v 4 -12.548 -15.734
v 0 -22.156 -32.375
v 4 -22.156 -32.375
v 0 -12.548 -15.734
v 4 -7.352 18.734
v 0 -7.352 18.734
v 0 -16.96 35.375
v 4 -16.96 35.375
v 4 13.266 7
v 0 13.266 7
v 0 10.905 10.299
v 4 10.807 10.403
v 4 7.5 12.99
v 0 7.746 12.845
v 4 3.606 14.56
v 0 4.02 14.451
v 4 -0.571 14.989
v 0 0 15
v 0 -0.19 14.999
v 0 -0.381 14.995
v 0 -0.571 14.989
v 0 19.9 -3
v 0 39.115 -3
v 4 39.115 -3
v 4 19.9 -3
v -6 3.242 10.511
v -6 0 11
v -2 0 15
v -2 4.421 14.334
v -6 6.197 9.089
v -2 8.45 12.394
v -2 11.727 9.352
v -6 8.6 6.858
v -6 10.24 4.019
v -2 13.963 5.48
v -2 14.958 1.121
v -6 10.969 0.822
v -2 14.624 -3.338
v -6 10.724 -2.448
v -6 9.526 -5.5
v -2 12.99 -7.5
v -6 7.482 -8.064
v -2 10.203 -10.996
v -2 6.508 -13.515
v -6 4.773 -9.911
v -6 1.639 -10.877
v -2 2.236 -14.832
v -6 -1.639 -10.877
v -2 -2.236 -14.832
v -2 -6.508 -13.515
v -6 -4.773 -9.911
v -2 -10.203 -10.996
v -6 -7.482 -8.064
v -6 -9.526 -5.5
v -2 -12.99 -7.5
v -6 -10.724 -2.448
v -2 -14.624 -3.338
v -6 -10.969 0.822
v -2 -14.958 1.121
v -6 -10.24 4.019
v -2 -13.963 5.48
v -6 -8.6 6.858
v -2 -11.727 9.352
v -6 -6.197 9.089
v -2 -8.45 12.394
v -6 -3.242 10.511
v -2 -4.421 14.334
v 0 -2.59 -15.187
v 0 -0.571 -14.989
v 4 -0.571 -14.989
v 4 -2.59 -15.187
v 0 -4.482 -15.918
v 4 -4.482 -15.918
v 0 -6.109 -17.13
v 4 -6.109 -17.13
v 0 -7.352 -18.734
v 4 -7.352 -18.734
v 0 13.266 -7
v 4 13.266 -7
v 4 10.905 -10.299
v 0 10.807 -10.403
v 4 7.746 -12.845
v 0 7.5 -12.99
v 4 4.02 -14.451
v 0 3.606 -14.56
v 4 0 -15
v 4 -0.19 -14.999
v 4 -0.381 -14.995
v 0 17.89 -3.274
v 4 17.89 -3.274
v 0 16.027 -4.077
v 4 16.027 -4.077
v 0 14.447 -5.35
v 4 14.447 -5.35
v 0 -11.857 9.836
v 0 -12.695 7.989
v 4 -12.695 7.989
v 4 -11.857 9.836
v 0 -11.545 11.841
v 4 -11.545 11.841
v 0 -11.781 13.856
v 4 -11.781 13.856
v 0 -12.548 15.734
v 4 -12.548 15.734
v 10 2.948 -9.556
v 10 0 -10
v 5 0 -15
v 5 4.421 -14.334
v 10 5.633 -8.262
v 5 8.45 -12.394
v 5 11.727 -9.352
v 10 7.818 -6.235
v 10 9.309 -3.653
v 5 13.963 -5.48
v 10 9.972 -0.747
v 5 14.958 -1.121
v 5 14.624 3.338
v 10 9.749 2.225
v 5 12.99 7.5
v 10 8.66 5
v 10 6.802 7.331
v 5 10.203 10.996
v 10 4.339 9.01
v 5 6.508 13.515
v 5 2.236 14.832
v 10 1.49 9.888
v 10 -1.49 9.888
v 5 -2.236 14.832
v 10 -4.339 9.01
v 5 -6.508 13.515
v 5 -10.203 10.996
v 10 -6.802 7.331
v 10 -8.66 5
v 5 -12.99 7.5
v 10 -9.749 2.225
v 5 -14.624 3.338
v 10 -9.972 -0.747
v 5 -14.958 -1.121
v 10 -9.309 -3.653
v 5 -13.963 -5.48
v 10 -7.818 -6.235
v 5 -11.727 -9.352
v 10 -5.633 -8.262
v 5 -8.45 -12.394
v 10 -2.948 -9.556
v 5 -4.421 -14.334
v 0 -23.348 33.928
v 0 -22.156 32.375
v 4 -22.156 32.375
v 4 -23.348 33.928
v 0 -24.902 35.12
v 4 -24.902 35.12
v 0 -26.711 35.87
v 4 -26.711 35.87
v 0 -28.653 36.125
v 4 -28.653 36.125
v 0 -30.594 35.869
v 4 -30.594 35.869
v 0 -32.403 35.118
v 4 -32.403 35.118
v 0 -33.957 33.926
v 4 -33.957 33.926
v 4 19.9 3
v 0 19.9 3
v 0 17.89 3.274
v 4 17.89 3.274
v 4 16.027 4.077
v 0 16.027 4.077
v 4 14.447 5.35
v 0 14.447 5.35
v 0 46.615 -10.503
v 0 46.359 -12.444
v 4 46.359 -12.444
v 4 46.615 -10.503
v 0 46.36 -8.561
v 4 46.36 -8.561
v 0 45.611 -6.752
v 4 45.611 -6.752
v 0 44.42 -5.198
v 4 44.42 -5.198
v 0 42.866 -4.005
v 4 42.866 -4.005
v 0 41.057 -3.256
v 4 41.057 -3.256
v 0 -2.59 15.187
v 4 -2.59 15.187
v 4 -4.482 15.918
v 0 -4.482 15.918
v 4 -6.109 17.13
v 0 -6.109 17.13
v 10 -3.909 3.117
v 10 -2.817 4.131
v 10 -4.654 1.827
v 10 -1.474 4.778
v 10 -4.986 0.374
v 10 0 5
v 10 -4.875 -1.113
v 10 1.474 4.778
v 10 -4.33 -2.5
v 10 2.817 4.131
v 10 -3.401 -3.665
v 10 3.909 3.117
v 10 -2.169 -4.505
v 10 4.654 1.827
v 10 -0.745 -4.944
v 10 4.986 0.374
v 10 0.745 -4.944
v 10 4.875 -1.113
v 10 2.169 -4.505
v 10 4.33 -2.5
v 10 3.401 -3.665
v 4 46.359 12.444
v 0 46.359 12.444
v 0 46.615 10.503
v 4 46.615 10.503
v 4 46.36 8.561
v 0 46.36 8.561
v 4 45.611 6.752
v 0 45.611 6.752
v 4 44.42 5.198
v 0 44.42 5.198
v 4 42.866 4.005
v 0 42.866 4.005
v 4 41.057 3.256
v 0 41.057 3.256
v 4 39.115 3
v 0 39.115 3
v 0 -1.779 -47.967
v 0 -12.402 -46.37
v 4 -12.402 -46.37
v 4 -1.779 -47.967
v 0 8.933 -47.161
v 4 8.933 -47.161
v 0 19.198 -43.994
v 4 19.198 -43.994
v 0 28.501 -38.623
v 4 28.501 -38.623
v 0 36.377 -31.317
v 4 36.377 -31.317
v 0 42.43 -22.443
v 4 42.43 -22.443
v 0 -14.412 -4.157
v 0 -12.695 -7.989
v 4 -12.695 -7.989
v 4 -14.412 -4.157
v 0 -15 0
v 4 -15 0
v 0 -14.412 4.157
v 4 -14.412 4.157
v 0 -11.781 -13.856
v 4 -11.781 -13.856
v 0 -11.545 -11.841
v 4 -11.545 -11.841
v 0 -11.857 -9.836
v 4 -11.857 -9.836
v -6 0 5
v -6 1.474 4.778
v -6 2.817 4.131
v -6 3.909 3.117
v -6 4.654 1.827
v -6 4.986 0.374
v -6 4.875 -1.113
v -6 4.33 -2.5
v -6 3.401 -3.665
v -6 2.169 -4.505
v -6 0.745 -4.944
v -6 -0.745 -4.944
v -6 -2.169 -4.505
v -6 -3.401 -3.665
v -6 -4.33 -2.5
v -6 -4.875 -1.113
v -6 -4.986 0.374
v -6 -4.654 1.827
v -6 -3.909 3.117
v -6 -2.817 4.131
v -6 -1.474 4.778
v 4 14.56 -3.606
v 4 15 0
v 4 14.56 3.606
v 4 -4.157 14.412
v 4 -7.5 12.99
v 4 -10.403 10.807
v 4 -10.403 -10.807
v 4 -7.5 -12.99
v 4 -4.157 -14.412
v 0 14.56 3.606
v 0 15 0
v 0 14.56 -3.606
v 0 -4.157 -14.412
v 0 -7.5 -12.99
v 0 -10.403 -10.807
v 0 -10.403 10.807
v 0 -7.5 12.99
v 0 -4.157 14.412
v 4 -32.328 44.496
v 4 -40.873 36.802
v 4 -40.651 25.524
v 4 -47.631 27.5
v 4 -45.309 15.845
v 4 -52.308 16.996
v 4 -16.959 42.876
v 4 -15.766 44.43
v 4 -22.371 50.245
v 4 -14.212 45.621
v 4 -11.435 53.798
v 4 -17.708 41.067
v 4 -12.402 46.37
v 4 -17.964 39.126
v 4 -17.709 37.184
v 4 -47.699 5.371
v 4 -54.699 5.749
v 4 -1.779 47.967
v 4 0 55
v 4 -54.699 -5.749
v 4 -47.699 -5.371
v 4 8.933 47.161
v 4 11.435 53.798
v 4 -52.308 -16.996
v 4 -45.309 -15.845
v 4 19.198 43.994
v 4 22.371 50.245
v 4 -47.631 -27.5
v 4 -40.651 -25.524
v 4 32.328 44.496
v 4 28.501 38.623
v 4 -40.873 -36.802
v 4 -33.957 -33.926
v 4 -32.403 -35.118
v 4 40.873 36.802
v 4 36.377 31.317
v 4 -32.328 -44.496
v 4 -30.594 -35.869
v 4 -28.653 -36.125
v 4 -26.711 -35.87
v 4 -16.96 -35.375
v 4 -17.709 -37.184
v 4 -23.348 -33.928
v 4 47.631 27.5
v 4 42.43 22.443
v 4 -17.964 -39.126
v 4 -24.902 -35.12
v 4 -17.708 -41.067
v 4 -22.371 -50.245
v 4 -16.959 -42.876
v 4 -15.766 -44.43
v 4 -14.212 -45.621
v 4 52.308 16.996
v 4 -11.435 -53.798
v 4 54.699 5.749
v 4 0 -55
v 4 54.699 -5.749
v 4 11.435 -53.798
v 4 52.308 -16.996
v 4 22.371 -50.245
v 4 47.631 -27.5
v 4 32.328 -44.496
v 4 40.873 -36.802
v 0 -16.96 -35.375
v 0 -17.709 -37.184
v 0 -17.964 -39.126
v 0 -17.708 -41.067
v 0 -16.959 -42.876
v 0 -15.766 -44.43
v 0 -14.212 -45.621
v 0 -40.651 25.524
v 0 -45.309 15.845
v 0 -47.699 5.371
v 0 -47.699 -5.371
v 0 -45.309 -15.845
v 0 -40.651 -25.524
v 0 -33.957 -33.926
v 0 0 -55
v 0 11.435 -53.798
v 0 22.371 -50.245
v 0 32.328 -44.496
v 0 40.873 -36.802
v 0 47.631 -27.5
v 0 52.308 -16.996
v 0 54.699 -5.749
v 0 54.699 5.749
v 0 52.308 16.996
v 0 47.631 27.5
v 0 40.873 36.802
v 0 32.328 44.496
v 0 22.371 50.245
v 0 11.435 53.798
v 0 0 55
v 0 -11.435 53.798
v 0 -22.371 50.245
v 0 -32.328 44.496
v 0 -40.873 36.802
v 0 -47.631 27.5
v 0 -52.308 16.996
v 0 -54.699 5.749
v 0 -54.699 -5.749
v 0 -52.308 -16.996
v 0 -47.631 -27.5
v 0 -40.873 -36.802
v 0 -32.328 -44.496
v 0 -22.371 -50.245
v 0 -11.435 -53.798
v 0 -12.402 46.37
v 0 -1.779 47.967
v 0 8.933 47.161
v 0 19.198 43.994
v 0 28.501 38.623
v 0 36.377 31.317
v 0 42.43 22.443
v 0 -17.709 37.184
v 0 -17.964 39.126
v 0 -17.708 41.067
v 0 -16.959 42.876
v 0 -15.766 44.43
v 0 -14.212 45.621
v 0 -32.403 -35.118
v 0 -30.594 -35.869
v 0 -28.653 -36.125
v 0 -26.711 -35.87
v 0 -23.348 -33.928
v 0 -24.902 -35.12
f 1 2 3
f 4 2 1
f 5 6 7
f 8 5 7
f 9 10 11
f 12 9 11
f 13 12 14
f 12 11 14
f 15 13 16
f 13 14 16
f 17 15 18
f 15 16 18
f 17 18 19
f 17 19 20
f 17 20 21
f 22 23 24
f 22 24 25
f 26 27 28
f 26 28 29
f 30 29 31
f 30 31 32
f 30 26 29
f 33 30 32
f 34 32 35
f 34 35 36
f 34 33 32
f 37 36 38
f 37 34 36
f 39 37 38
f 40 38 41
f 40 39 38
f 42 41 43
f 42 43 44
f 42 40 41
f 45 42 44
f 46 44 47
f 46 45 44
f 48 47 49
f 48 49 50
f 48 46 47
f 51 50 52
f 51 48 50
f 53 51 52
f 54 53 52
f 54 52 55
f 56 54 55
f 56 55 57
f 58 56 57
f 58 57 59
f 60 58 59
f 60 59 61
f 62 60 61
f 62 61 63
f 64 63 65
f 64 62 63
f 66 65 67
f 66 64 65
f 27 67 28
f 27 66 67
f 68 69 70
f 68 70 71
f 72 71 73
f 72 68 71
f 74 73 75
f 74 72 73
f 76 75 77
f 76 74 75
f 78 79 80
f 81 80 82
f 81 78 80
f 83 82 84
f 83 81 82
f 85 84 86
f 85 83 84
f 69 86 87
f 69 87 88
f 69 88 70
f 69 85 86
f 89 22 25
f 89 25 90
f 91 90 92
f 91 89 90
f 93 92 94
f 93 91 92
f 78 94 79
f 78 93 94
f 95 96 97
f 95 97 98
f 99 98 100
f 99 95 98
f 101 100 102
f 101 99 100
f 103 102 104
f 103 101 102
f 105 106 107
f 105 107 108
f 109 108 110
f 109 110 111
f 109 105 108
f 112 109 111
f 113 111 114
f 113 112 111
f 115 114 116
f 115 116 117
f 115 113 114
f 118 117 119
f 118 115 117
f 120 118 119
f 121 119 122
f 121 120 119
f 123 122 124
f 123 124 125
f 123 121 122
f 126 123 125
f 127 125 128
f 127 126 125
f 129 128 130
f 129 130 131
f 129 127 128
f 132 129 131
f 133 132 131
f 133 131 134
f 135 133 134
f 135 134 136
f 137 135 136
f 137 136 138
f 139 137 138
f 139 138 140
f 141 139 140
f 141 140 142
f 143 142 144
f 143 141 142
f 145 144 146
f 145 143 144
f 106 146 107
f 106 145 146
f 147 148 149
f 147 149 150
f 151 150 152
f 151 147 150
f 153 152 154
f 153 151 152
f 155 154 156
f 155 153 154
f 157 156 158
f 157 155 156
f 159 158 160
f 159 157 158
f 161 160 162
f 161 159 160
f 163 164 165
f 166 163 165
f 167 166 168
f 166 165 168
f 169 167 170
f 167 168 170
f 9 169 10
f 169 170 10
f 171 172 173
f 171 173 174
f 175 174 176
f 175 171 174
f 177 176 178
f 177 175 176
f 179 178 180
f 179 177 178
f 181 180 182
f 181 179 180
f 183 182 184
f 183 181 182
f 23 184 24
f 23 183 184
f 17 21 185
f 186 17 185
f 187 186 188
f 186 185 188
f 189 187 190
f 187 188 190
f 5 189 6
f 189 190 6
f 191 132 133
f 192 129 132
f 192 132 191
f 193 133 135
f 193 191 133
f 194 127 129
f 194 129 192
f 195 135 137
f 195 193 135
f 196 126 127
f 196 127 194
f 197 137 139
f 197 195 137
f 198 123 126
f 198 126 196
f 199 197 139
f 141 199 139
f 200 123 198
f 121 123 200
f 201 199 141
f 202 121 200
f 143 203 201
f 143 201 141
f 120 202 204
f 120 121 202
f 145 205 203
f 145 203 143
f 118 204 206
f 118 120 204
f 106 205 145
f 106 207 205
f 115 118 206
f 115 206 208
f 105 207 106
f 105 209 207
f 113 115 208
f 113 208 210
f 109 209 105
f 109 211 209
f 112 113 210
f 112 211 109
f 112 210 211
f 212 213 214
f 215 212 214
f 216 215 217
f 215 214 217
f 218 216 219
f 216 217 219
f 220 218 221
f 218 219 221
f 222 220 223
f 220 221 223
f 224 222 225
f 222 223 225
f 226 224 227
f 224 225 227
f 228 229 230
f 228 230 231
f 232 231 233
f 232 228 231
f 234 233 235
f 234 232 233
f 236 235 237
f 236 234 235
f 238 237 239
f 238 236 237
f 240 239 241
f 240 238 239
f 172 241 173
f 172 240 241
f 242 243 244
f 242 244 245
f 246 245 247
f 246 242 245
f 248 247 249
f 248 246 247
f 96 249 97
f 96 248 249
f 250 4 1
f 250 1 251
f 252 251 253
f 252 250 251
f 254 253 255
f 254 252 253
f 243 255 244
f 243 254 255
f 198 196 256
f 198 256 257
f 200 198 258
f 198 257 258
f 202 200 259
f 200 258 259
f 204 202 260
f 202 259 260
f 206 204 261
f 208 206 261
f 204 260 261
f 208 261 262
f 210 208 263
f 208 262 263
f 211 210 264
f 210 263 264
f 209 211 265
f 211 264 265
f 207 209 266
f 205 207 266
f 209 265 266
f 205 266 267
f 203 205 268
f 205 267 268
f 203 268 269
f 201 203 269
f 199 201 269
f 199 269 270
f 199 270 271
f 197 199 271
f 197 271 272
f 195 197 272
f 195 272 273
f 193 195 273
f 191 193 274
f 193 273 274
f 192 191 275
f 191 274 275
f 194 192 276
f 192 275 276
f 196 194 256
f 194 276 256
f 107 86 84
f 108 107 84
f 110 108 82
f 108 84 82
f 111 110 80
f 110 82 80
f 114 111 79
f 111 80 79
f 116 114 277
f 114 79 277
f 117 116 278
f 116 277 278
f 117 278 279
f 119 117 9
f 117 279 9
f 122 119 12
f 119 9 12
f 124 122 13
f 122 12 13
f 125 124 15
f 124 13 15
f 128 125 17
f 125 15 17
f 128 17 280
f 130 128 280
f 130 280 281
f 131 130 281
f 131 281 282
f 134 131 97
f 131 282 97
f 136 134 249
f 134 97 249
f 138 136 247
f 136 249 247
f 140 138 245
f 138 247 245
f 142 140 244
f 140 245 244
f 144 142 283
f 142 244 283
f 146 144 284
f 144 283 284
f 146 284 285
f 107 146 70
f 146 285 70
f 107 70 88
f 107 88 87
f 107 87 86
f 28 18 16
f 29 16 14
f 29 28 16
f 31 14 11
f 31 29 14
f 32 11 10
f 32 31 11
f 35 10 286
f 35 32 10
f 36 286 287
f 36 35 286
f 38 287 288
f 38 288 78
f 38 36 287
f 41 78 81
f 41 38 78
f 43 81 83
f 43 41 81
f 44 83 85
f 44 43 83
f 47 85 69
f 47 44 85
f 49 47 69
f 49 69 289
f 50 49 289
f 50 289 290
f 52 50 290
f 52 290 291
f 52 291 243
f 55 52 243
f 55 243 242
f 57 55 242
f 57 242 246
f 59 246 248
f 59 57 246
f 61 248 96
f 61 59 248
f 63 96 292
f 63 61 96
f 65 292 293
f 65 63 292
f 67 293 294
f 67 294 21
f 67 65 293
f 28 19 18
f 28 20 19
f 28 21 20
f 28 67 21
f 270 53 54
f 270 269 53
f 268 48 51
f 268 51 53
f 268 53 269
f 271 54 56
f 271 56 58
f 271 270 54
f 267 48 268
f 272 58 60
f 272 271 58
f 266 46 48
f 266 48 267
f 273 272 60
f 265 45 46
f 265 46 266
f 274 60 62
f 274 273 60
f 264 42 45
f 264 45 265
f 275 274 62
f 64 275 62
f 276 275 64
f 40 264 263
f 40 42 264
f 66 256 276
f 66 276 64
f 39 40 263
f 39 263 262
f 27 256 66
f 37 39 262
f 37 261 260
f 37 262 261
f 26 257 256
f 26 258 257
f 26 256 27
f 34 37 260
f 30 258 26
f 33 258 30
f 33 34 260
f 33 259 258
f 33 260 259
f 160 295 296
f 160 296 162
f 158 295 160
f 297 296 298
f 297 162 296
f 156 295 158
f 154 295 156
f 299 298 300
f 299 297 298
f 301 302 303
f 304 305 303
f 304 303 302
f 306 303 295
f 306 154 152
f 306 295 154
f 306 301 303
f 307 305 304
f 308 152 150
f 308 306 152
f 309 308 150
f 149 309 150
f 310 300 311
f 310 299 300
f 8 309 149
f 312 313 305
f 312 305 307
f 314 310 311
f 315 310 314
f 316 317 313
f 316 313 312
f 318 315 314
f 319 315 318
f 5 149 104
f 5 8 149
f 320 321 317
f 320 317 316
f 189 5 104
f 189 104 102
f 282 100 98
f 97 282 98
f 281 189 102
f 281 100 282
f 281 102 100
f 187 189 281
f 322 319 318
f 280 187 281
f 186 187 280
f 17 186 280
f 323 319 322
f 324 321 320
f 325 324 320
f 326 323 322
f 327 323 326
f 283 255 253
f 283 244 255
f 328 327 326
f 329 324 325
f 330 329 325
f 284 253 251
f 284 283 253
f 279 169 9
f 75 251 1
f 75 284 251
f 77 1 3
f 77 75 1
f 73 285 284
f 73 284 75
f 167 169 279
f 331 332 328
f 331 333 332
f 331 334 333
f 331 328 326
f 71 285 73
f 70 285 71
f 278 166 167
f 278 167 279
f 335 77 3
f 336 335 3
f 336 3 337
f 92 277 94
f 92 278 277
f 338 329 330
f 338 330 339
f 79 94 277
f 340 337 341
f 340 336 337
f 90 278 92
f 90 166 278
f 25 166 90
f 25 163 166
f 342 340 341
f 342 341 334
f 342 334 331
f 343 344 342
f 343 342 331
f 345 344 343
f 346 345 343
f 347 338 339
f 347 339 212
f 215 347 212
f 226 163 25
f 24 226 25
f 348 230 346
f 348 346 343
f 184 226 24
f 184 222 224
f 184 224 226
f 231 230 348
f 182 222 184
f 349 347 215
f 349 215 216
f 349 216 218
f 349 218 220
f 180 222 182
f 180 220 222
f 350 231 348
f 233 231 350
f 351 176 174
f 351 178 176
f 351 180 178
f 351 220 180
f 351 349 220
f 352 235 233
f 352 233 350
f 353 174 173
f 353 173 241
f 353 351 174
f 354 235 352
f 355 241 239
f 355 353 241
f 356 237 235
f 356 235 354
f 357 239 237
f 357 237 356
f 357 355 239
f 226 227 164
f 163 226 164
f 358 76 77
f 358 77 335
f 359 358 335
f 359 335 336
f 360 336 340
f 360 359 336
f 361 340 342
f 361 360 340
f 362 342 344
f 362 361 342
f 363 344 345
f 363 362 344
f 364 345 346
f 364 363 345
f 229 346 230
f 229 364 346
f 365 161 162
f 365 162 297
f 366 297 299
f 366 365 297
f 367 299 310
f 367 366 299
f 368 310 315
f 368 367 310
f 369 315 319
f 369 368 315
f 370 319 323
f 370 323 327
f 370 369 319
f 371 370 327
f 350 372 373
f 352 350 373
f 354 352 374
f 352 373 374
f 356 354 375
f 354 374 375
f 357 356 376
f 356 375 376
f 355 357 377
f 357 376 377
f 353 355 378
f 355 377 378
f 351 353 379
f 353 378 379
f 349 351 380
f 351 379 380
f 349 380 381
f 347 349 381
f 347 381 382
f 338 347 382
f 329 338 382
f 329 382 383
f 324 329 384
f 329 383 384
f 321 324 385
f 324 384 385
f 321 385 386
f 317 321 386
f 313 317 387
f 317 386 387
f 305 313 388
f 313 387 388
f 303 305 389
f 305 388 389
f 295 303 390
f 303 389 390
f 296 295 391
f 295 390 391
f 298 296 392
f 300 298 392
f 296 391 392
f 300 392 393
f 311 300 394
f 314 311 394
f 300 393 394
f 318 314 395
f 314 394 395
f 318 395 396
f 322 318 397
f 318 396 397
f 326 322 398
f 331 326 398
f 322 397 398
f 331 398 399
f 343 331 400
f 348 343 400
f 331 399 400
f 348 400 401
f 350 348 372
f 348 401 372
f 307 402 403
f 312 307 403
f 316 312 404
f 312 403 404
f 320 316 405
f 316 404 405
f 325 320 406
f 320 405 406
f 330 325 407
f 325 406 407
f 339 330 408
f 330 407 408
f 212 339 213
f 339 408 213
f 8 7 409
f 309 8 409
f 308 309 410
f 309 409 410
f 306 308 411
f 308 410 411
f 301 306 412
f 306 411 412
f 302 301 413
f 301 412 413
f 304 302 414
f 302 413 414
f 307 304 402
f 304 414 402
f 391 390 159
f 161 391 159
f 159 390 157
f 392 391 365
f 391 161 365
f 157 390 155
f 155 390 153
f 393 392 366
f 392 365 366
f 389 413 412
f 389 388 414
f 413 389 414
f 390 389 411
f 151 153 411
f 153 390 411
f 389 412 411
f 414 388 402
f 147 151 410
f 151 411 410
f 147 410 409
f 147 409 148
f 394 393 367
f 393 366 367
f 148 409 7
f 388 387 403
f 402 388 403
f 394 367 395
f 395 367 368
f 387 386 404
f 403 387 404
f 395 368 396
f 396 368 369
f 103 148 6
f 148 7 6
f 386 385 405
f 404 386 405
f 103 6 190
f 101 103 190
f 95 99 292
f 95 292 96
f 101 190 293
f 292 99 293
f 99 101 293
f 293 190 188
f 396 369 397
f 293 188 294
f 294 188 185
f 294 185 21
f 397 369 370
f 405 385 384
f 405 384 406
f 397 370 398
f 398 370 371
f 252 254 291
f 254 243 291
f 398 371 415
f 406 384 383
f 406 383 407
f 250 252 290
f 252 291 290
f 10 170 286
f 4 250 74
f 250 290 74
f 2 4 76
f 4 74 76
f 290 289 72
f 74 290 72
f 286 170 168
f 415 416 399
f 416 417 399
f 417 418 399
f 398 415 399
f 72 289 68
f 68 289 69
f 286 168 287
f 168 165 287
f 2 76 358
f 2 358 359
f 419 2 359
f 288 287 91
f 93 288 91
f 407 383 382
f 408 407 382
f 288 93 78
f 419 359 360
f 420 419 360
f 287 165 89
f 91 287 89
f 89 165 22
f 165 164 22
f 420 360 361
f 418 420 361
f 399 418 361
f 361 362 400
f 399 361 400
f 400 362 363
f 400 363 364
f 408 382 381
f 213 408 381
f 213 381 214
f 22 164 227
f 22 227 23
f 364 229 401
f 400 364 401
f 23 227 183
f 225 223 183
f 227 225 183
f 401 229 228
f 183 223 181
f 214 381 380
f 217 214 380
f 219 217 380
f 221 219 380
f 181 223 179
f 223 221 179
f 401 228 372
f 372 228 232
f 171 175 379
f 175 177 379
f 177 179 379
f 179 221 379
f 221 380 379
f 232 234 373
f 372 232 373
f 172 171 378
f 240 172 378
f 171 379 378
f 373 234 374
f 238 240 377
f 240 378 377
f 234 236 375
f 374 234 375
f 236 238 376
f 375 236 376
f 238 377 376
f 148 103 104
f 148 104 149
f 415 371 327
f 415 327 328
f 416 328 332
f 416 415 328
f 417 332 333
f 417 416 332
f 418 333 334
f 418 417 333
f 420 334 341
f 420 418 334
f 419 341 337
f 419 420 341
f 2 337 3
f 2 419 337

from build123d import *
from build123d.topology import SkipClean

# Parameters (mm, degrees)
SKETCH_1_R          = 55
EXTRUDE_1_DEPTH     = 4
SKETCH_4_R          = 15
SKETCH_3_R          = 15
SKETCH_7_R          = 15
SKETCH_6_R          = 15
SKETCH_9_R          = 5
CUT_EXTRUDE_1_DEPTH = 24
CHAMFER_1_SIZE      = 5
CHAMFER_2_SIZE      = 4


with BuildPart() as part:
    # 草图1 → 凸台-拉伸1 (new body)
    with BuildSketch(Plane(origin=(0, 0, 0), x_dir=(0, 0, -1), z_dir=(1, 0, 0))):
        Circle(SKETCH_1_R)
        with BuildLine():
            Line((-3, 39.115214431), (-3, 19.899748742))
            ThreePointArc((-3, 19.899748742), (-4.077383711, 16.026765396), (-7, 13.266499161))
            ThreePointArc((-7, 13.266499161), (-12.990381057, 7.5), (-14.989125293, -0.571071754))
            ThreePointArc((-14.989125293, -0.571071754), (-15.918277829, -4.482264824), (-18.73368794, -7.35179816))
            Line((-18.73368794, -7.35179816), (-35.374769372, -16.959531004))
            ThreePointArc((-35.374769372, -16.959531004), (-41.996474081, -17.39278273), (-46.370097033, -12.402181305))
            ThreePointArc((-46.370097033, -12.402181305), (-41.569219382, 24), (-12.444444444, 46.358772659))
            ThreePointArc((-12.444444444, 46.358772659), (-5.935645354, 45.066404788), (-3, 39.115214431))
        make_face(mode=Mode.SUBTRACT)
        with BuildLine():
            Line((3, 39.115214431), (3, 19.899748742))
            ThreePointArc((3, 19.899748742), (4.077383711, 16.026765396), (7, 13.266499161))
            ThreePointArc((7, 13.266499161), (12.990381057, 7.5), (14.989125293, -0.571071754))
            ThreePointArc((14.989125293, -0.571071754), (15.918277829, -4.482264824), (18.73368794, -7.35179816))
            Line((18.73368794, -7.35179816), (35.374769372, -16.959531004))
            ThreePointArc((35.374769372, -16.959531004), (41.996474081, -17.39278273), (46.370097033, -12.402181305))
            ThreePointArc((46.370097033, -12.402181305), (41.569219382, 24), (12.444444444, 46.358772659))
            ThreePointArc((12.444444444, 46.358772659), (5.935645354, 45.066404788), (3, 39.115214431))
        make_face(mode=Mode.SUBTRACT)
        with BuildLine():
            Line((32.374769372, -22.155683427), (15.73368794, -12.547950582))
            ThreePointArc((15.73368794, -12.547950582), (11.840894118, -11.544500572), (7.989125293, -12.695427407))
            ThreePointArc((7.989125293, -12.695427407), (0, -15), (-7.989125293, -12.695427407))
            ThreePointArc((-7.989125293, -12.695427407), (-11.840894118, -11.544500572), (-15.73368794, -12.547950582))
            Line((-15.73368794, -12.547950582), (-32.374769372, -22.155683427))
            ThreePointArc((-32.374769372, -22.155683427), (-36.060828727, -27.673622059), (-33.925652589, -33.956591354))
            ThreePointArc((-33.925652589, -33.956591354), (0, -48), (33.925652589, -33.956591354))
            ThreePointArc((33.925652589, -33.956591354), (36.060828727, -27.673622059), (32.374769372, -22.155683427))
        make_face(mode=Mode.SUBTRACT)
    extrude(amount=EXTRUDE_1_DEPTH)

    # 草图4 → 放样1 section 0
    with BuildSketch(Plane.ZY):
        Circle(SKETCH_4_R)
    # 草图3 → 放样1 section 1
    with BuildSketch(Plane.ZY.offset(6)):
        Circle(SKETCH_3_R)
    loft()

    # 草图7 → 放样2 section 0
    with SkipClean():  # the faces are left unmerged after this step: merging them gives an invalid solid
        with BuildSketch(Plane(origin=(10, 0, 0), x_dir=(0, 0, -1), z_dir=(1, 0, 0))):
            Circle(SKETCH_7_R)
        # 草图6 → 放样2 section 1
        with BuildSketch(Plane(origin=(4, 0, 0), x_dir=(0, 0, -1), z_dir=(1, 0, 0))):
            Circle(SKETCH_6_R)
        loft()

    # 草图9 → 切除-拉伸1 (cut, symmetric)
    with SkipClean():  # the faces are left unmerged after this step: merging them gives an invalid solid
        with BuildSketch(Plane.ZY.offset(6)):
            Circle(SKETCH_9_R)
        extrude(amount=CUT_EXTRUDE_1_DEPTH, both=True, mode=Mode.SUBTRACT)

    # 倒角1
    chamfer_1_edges = [part.edges().sort_by_distance(p)[0] for p in [
        (10, 0, 15),
    ]]
    chamfer(chamfer_1_edges, length=CHAMFER_1_SIZE)

    # 倒角2
    chamfer_2_edges = [part.edges().sort_by_distance(p)[0] for p in [
        (-6, 0, -15),
    ]]
    chamfer(chamfer_2_edges, length=CHAMFER_2_SIZE)


solid = part.part
